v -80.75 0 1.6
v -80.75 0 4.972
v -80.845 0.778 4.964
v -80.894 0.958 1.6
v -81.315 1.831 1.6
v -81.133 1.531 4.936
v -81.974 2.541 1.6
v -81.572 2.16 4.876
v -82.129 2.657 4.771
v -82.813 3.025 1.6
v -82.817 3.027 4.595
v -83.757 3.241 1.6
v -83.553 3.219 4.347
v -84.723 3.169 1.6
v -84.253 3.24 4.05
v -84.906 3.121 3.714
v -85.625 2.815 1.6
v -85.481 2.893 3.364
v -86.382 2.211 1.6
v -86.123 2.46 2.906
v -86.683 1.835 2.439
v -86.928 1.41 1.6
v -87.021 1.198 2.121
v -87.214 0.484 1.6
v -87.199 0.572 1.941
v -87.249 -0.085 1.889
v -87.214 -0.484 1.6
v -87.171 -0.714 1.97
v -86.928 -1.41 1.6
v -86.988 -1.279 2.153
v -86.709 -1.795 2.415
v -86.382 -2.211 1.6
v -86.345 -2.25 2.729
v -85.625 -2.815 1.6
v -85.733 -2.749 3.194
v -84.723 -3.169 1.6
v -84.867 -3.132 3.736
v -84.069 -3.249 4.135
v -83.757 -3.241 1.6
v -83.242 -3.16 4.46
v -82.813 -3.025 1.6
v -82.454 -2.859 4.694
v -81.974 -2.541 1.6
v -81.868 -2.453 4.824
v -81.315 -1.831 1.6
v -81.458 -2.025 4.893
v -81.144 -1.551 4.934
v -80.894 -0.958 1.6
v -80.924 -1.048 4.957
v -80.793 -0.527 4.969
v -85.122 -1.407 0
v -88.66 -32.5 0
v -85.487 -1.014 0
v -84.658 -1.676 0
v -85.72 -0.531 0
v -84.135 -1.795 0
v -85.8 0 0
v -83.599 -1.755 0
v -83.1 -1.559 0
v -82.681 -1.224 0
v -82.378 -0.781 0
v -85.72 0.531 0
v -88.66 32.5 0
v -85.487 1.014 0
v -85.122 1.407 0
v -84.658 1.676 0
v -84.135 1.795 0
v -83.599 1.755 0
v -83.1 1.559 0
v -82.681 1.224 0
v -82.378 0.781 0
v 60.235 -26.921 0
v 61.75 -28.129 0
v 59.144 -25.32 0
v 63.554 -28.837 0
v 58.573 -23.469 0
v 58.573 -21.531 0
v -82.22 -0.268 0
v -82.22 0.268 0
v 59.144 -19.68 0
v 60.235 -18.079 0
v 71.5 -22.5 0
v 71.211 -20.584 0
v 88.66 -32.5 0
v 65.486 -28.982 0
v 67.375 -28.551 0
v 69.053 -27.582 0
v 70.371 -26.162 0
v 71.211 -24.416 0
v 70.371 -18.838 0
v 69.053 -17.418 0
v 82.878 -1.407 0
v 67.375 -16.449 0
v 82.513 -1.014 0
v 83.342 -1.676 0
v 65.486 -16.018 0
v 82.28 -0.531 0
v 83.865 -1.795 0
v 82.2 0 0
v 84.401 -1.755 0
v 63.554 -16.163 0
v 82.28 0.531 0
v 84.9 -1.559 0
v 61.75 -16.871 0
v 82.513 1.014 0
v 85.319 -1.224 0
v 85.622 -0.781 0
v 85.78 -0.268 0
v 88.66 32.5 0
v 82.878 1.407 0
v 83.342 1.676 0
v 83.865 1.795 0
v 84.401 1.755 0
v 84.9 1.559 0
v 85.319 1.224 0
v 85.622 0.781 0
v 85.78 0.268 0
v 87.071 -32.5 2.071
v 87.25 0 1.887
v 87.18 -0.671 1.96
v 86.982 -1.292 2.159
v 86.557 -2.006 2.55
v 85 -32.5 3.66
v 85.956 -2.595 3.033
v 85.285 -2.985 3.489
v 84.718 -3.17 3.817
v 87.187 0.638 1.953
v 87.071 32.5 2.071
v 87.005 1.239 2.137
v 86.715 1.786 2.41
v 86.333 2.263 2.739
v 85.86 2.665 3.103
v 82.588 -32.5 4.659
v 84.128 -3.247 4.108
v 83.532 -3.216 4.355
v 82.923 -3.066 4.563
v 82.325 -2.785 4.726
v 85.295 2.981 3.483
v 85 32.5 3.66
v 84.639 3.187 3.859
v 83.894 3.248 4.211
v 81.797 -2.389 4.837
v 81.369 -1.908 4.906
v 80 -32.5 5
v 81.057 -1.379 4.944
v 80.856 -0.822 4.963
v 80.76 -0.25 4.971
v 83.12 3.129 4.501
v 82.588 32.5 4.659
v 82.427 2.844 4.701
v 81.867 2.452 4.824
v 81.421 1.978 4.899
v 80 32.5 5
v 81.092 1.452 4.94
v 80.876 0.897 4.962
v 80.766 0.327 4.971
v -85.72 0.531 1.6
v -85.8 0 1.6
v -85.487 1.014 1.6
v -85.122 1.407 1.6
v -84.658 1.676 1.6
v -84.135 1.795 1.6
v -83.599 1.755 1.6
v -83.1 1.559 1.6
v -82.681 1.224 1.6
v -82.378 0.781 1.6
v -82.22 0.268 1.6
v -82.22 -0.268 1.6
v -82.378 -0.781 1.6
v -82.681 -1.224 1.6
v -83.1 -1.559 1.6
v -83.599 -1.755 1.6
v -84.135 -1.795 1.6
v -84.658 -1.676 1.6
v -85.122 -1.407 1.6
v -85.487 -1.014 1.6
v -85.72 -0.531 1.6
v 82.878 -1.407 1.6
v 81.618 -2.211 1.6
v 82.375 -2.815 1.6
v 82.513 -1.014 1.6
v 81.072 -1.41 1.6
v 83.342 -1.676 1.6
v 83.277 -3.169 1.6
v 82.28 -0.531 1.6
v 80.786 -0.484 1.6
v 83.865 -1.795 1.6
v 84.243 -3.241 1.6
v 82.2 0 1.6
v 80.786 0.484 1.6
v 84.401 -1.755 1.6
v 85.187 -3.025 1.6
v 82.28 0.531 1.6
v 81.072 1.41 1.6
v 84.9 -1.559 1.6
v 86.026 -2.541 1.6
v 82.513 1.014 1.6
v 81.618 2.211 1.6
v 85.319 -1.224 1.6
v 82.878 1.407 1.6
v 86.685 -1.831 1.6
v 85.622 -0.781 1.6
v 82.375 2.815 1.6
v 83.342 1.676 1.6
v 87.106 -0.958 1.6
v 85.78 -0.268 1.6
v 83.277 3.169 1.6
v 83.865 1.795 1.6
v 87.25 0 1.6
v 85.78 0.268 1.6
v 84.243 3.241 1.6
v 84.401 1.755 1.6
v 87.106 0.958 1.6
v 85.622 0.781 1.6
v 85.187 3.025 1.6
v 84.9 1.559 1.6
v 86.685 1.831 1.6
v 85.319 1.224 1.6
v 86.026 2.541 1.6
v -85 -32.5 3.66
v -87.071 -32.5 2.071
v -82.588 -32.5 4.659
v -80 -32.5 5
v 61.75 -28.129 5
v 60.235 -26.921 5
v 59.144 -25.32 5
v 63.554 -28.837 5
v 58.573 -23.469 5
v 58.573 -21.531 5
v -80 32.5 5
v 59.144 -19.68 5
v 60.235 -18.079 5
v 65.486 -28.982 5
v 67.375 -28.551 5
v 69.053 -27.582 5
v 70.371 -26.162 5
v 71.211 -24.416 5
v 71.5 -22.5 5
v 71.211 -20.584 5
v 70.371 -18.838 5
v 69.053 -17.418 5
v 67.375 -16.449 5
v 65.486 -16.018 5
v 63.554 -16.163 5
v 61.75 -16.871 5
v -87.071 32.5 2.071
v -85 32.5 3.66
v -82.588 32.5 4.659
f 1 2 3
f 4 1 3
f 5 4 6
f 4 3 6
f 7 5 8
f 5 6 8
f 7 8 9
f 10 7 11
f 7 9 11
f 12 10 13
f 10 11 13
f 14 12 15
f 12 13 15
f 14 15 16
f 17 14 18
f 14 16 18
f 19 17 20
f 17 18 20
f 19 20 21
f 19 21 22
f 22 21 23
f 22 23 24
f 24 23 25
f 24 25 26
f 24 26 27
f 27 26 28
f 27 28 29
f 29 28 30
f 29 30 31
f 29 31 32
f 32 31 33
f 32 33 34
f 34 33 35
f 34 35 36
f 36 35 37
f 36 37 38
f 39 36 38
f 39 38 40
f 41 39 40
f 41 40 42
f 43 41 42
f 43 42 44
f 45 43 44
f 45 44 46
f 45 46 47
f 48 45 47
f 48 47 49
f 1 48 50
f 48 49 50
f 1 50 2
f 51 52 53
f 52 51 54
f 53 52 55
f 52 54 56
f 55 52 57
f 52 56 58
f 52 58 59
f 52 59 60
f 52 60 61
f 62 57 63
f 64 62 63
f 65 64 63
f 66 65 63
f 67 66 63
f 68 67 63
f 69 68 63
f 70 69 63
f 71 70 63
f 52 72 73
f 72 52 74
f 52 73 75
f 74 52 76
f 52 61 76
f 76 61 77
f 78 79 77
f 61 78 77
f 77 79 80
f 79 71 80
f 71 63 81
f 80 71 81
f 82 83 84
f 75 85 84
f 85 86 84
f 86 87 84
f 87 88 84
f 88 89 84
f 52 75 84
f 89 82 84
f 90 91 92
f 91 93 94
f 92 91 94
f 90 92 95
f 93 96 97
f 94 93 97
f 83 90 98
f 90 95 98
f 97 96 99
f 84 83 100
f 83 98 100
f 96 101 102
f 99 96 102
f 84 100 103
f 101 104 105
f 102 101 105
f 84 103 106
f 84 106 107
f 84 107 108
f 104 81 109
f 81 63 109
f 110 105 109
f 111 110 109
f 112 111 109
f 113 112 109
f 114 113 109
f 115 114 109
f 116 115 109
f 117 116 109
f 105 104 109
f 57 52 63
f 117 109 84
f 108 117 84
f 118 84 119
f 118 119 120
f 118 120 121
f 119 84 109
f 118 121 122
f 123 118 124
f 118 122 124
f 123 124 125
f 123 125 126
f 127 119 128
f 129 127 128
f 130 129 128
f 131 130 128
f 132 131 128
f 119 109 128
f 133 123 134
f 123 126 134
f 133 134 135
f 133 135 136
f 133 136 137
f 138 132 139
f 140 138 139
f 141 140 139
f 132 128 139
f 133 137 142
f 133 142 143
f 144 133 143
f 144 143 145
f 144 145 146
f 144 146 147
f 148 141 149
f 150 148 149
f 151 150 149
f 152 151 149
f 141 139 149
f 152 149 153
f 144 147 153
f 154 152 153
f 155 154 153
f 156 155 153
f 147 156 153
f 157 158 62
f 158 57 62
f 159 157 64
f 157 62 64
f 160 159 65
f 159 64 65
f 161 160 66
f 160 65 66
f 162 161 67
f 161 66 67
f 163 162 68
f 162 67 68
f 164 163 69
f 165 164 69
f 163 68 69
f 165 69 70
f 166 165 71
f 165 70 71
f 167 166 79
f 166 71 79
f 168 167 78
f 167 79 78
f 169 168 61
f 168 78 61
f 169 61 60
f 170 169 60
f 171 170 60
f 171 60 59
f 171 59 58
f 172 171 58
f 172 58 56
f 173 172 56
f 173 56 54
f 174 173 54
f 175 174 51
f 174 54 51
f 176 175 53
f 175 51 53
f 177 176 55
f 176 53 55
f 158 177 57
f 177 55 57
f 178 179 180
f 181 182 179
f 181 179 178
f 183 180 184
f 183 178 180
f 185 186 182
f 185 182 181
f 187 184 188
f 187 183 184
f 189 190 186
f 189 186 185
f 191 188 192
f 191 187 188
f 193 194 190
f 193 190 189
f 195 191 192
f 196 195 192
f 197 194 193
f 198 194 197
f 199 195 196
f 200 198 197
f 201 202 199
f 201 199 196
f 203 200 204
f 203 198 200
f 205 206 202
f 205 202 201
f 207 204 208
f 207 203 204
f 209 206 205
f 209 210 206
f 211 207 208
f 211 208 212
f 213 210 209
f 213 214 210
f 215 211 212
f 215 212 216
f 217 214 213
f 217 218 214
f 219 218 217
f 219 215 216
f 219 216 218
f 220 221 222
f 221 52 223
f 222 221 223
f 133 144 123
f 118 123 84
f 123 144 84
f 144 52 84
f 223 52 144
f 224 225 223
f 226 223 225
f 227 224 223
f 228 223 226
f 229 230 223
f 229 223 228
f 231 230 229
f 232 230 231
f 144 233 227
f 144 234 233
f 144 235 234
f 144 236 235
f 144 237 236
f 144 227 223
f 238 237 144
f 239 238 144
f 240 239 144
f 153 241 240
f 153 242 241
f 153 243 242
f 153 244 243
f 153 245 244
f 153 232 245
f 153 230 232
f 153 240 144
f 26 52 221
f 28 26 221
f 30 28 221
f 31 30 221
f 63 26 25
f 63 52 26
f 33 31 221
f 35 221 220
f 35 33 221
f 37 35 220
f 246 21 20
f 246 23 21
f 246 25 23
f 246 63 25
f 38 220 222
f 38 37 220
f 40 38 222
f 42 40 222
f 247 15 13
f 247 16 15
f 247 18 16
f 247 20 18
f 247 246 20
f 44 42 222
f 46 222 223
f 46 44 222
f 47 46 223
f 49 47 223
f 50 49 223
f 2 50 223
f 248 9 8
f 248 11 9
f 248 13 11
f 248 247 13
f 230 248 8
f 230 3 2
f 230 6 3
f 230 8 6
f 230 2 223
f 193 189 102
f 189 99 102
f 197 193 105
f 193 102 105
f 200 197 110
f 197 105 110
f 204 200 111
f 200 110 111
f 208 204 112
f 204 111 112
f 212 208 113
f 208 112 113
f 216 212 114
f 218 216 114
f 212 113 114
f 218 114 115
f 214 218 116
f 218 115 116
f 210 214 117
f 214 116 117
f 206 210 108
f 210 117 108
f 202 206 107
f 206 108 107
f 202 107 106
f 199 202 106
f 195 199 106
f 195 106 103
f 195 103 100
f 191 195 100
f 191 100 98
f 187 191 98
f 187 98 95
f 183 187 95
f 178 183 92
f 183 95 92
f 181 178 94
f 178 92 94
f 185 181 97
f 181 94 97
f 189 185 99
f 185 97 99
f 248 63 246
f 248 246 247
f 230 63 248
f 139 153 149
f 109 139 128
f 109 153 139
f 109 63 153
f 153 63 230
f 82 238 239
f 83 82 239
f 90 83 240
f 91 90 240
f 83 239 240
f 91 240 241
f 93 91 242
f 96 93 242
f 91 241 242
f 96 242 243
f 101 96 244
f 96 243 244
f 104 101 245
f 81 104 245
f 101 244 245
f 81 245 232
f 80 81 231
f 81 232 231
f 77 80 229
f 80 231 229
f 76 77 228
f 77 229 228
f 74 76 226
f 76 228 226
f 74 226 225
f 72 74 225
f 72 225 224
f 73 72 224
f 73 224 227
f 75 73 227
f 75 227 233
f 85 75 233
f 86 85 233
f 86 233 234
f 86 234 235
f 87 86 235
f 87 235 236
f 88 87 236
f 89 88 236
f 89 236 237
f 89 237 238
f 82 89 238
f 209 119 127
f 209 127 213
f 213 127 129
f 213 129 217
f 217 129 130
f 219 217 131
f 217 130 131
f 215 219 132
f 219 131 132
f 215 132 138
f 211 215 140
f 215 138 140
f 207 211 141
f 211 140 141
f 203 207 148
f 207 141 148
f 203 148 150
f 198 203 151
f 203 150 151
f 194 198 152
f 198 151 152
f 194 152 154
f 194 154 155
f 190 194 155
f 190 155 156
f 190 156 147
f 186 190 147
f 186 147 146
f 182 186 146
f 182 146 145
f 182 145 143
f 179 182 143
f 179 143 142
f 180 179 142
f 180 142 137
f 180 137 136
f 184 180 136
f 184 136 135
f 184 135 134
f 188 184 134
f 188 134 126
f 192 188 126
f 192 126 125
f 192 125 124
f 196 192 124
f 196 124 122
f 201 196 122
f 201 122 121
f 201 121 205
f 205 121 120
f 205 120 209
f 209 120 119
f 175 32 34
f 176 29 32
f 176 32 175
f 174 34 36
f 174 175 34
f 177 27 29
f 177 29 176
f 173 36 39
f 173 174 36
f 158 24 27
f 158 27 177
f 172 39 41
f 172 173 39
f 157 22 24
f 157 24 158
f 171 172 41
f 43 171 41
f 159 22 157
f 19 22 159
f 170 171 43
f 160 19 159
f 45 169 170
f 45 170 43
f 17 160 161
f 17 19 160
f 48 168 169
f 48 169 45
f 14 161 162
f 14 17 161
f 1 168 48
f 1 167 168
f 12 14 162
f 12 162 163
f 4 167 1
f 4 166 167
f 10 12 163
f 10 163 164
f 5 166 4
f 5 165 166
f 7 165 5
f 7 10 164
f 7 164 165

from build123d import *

# Parameters (mm, degrees)
SKIZZE1_W                                            = 180
SKIZZE1_H                                            = 65
AUFSATZ_LINEAR_AUSTRAGEN1_DEPTH                      = 5
STIRNSENKUNG_F_R_M3_ZYLINDERSCHRAUBE_MIT_D           = 3.6
STIRNSENKUNG_F_R_M3_ZYLINDERSCHRAUBE_MIT_DEPTH       = 9.1
STIRNSENKUNG_F_R_M3_ZYLINDERSCHRAUBE_MIT_CBORE_D     = 6.5
STIRNSENKUNG_F_R_M3_ZYLINDERSCHRAUBE_MIT_CBORE_DEPTH = 3.4
STIRNSENKUNG_F_R_M3_ZYLINDERSCHRAUBE_MIT_TIP         = 1.081549114
SCHNITT_LINEAR_AUSTRAGEN1_DEPTH                      = 66
SKIZZE7_R                                            = 6.5
SCHNITT_LINEAR_AUSTRAGEN2_DEPTH                      = 6.0000001


with BuildPart() as part:
    # Skizze1 → Aufsatz-Linear austragen1 (new body)
    with BuildSketch(Plane.XY):
        Rectangle(SKIZZE1_W, SKIZZE1_H)
    extrude(amount=AUFSATZ_LINEAR_AUSTRAGEN1_DEPTH)

    # Stirnsenkung für M3 Zylinderschraube mit Innensechskant1
    with Locations(Plane.XY.offset(5)):
        with Locations((-84, 0), (84, 0)):
            CounterBoreHole(STIRNSENKUNG_F_R_M3_ZYLINDERSCHRAUBE_MIT_D / 2, STIRNSENKUNG_F_R_M3_ZYLINDERSCHRAUBE_MIT_CBORE_D / 2, STIRNSENKUNG_F_R_M3_ZYLINDERSCHRAUBE_MIT_CBORE_DEPTH, depth=STIRNSENKUNG_F_R_M3_ZYLINDERSCHRAUBE_MIT_DEPTH)
            with Locations((0, 0, -(STIRNSENKUNG_F_R_M3_ZYLINDERSCHRAUBE_MIT_DEPTH + STIRNSENKUNG_F_R_M3_ZYLINDERSCHRAUBE_MIT_TIP / 2))):  # 118° drill point
                Cone(0, STIRNSENKUNG_F_R_M3_ZYLINDERSCHRAUBE_MIT_D / 2, STIRNSENKUNG_F_R_M3_ZYLINDERSCHRAUBE_MIT_TIP, mode=Mode.SUBTRACT)

    # Skizze6 → Schnitt-Linear austragen1 (cut, through all)
    with BuildSketch(Plane(origin=(0, 32.5, 0), x_dir=(1, 0, 0), z_dir=(0, 1, 0))):
        with BuildLine():
            Line((-90, -5), (-90, 5))
            ThreePointArc((-90, 5), (-87.071067812, -2.071067812), (-80, -5))
            Line((-80, -5), (-90, -5))
        make_face()
        with BuildLine():
            Line((80, -5), (90, -5))
            Line((90, -5), (90, 5))
            ThreePointArc((90, 5), (87.071067812, -2.071067812), (80, -5))
        make_face()
    extrude(amount=-SCHNITT_LINEAR_AUSTRAGEN1_DEPTH, mode=Mode.SUBTRACT)

    # Skizze7 → Schnitt-Linear austragen2 (cut, through all)
    with BuildSketch(Plane.XY.offset(5)):
        with Locations((65, -22.5)):
            Circle(SKIZZE7_R)
    extrude(amount=-SCHNITT_LINEAR_AUSTRAGEN2_DEPTH, mode=Mode.SUBTRACT)


solid = part.part
